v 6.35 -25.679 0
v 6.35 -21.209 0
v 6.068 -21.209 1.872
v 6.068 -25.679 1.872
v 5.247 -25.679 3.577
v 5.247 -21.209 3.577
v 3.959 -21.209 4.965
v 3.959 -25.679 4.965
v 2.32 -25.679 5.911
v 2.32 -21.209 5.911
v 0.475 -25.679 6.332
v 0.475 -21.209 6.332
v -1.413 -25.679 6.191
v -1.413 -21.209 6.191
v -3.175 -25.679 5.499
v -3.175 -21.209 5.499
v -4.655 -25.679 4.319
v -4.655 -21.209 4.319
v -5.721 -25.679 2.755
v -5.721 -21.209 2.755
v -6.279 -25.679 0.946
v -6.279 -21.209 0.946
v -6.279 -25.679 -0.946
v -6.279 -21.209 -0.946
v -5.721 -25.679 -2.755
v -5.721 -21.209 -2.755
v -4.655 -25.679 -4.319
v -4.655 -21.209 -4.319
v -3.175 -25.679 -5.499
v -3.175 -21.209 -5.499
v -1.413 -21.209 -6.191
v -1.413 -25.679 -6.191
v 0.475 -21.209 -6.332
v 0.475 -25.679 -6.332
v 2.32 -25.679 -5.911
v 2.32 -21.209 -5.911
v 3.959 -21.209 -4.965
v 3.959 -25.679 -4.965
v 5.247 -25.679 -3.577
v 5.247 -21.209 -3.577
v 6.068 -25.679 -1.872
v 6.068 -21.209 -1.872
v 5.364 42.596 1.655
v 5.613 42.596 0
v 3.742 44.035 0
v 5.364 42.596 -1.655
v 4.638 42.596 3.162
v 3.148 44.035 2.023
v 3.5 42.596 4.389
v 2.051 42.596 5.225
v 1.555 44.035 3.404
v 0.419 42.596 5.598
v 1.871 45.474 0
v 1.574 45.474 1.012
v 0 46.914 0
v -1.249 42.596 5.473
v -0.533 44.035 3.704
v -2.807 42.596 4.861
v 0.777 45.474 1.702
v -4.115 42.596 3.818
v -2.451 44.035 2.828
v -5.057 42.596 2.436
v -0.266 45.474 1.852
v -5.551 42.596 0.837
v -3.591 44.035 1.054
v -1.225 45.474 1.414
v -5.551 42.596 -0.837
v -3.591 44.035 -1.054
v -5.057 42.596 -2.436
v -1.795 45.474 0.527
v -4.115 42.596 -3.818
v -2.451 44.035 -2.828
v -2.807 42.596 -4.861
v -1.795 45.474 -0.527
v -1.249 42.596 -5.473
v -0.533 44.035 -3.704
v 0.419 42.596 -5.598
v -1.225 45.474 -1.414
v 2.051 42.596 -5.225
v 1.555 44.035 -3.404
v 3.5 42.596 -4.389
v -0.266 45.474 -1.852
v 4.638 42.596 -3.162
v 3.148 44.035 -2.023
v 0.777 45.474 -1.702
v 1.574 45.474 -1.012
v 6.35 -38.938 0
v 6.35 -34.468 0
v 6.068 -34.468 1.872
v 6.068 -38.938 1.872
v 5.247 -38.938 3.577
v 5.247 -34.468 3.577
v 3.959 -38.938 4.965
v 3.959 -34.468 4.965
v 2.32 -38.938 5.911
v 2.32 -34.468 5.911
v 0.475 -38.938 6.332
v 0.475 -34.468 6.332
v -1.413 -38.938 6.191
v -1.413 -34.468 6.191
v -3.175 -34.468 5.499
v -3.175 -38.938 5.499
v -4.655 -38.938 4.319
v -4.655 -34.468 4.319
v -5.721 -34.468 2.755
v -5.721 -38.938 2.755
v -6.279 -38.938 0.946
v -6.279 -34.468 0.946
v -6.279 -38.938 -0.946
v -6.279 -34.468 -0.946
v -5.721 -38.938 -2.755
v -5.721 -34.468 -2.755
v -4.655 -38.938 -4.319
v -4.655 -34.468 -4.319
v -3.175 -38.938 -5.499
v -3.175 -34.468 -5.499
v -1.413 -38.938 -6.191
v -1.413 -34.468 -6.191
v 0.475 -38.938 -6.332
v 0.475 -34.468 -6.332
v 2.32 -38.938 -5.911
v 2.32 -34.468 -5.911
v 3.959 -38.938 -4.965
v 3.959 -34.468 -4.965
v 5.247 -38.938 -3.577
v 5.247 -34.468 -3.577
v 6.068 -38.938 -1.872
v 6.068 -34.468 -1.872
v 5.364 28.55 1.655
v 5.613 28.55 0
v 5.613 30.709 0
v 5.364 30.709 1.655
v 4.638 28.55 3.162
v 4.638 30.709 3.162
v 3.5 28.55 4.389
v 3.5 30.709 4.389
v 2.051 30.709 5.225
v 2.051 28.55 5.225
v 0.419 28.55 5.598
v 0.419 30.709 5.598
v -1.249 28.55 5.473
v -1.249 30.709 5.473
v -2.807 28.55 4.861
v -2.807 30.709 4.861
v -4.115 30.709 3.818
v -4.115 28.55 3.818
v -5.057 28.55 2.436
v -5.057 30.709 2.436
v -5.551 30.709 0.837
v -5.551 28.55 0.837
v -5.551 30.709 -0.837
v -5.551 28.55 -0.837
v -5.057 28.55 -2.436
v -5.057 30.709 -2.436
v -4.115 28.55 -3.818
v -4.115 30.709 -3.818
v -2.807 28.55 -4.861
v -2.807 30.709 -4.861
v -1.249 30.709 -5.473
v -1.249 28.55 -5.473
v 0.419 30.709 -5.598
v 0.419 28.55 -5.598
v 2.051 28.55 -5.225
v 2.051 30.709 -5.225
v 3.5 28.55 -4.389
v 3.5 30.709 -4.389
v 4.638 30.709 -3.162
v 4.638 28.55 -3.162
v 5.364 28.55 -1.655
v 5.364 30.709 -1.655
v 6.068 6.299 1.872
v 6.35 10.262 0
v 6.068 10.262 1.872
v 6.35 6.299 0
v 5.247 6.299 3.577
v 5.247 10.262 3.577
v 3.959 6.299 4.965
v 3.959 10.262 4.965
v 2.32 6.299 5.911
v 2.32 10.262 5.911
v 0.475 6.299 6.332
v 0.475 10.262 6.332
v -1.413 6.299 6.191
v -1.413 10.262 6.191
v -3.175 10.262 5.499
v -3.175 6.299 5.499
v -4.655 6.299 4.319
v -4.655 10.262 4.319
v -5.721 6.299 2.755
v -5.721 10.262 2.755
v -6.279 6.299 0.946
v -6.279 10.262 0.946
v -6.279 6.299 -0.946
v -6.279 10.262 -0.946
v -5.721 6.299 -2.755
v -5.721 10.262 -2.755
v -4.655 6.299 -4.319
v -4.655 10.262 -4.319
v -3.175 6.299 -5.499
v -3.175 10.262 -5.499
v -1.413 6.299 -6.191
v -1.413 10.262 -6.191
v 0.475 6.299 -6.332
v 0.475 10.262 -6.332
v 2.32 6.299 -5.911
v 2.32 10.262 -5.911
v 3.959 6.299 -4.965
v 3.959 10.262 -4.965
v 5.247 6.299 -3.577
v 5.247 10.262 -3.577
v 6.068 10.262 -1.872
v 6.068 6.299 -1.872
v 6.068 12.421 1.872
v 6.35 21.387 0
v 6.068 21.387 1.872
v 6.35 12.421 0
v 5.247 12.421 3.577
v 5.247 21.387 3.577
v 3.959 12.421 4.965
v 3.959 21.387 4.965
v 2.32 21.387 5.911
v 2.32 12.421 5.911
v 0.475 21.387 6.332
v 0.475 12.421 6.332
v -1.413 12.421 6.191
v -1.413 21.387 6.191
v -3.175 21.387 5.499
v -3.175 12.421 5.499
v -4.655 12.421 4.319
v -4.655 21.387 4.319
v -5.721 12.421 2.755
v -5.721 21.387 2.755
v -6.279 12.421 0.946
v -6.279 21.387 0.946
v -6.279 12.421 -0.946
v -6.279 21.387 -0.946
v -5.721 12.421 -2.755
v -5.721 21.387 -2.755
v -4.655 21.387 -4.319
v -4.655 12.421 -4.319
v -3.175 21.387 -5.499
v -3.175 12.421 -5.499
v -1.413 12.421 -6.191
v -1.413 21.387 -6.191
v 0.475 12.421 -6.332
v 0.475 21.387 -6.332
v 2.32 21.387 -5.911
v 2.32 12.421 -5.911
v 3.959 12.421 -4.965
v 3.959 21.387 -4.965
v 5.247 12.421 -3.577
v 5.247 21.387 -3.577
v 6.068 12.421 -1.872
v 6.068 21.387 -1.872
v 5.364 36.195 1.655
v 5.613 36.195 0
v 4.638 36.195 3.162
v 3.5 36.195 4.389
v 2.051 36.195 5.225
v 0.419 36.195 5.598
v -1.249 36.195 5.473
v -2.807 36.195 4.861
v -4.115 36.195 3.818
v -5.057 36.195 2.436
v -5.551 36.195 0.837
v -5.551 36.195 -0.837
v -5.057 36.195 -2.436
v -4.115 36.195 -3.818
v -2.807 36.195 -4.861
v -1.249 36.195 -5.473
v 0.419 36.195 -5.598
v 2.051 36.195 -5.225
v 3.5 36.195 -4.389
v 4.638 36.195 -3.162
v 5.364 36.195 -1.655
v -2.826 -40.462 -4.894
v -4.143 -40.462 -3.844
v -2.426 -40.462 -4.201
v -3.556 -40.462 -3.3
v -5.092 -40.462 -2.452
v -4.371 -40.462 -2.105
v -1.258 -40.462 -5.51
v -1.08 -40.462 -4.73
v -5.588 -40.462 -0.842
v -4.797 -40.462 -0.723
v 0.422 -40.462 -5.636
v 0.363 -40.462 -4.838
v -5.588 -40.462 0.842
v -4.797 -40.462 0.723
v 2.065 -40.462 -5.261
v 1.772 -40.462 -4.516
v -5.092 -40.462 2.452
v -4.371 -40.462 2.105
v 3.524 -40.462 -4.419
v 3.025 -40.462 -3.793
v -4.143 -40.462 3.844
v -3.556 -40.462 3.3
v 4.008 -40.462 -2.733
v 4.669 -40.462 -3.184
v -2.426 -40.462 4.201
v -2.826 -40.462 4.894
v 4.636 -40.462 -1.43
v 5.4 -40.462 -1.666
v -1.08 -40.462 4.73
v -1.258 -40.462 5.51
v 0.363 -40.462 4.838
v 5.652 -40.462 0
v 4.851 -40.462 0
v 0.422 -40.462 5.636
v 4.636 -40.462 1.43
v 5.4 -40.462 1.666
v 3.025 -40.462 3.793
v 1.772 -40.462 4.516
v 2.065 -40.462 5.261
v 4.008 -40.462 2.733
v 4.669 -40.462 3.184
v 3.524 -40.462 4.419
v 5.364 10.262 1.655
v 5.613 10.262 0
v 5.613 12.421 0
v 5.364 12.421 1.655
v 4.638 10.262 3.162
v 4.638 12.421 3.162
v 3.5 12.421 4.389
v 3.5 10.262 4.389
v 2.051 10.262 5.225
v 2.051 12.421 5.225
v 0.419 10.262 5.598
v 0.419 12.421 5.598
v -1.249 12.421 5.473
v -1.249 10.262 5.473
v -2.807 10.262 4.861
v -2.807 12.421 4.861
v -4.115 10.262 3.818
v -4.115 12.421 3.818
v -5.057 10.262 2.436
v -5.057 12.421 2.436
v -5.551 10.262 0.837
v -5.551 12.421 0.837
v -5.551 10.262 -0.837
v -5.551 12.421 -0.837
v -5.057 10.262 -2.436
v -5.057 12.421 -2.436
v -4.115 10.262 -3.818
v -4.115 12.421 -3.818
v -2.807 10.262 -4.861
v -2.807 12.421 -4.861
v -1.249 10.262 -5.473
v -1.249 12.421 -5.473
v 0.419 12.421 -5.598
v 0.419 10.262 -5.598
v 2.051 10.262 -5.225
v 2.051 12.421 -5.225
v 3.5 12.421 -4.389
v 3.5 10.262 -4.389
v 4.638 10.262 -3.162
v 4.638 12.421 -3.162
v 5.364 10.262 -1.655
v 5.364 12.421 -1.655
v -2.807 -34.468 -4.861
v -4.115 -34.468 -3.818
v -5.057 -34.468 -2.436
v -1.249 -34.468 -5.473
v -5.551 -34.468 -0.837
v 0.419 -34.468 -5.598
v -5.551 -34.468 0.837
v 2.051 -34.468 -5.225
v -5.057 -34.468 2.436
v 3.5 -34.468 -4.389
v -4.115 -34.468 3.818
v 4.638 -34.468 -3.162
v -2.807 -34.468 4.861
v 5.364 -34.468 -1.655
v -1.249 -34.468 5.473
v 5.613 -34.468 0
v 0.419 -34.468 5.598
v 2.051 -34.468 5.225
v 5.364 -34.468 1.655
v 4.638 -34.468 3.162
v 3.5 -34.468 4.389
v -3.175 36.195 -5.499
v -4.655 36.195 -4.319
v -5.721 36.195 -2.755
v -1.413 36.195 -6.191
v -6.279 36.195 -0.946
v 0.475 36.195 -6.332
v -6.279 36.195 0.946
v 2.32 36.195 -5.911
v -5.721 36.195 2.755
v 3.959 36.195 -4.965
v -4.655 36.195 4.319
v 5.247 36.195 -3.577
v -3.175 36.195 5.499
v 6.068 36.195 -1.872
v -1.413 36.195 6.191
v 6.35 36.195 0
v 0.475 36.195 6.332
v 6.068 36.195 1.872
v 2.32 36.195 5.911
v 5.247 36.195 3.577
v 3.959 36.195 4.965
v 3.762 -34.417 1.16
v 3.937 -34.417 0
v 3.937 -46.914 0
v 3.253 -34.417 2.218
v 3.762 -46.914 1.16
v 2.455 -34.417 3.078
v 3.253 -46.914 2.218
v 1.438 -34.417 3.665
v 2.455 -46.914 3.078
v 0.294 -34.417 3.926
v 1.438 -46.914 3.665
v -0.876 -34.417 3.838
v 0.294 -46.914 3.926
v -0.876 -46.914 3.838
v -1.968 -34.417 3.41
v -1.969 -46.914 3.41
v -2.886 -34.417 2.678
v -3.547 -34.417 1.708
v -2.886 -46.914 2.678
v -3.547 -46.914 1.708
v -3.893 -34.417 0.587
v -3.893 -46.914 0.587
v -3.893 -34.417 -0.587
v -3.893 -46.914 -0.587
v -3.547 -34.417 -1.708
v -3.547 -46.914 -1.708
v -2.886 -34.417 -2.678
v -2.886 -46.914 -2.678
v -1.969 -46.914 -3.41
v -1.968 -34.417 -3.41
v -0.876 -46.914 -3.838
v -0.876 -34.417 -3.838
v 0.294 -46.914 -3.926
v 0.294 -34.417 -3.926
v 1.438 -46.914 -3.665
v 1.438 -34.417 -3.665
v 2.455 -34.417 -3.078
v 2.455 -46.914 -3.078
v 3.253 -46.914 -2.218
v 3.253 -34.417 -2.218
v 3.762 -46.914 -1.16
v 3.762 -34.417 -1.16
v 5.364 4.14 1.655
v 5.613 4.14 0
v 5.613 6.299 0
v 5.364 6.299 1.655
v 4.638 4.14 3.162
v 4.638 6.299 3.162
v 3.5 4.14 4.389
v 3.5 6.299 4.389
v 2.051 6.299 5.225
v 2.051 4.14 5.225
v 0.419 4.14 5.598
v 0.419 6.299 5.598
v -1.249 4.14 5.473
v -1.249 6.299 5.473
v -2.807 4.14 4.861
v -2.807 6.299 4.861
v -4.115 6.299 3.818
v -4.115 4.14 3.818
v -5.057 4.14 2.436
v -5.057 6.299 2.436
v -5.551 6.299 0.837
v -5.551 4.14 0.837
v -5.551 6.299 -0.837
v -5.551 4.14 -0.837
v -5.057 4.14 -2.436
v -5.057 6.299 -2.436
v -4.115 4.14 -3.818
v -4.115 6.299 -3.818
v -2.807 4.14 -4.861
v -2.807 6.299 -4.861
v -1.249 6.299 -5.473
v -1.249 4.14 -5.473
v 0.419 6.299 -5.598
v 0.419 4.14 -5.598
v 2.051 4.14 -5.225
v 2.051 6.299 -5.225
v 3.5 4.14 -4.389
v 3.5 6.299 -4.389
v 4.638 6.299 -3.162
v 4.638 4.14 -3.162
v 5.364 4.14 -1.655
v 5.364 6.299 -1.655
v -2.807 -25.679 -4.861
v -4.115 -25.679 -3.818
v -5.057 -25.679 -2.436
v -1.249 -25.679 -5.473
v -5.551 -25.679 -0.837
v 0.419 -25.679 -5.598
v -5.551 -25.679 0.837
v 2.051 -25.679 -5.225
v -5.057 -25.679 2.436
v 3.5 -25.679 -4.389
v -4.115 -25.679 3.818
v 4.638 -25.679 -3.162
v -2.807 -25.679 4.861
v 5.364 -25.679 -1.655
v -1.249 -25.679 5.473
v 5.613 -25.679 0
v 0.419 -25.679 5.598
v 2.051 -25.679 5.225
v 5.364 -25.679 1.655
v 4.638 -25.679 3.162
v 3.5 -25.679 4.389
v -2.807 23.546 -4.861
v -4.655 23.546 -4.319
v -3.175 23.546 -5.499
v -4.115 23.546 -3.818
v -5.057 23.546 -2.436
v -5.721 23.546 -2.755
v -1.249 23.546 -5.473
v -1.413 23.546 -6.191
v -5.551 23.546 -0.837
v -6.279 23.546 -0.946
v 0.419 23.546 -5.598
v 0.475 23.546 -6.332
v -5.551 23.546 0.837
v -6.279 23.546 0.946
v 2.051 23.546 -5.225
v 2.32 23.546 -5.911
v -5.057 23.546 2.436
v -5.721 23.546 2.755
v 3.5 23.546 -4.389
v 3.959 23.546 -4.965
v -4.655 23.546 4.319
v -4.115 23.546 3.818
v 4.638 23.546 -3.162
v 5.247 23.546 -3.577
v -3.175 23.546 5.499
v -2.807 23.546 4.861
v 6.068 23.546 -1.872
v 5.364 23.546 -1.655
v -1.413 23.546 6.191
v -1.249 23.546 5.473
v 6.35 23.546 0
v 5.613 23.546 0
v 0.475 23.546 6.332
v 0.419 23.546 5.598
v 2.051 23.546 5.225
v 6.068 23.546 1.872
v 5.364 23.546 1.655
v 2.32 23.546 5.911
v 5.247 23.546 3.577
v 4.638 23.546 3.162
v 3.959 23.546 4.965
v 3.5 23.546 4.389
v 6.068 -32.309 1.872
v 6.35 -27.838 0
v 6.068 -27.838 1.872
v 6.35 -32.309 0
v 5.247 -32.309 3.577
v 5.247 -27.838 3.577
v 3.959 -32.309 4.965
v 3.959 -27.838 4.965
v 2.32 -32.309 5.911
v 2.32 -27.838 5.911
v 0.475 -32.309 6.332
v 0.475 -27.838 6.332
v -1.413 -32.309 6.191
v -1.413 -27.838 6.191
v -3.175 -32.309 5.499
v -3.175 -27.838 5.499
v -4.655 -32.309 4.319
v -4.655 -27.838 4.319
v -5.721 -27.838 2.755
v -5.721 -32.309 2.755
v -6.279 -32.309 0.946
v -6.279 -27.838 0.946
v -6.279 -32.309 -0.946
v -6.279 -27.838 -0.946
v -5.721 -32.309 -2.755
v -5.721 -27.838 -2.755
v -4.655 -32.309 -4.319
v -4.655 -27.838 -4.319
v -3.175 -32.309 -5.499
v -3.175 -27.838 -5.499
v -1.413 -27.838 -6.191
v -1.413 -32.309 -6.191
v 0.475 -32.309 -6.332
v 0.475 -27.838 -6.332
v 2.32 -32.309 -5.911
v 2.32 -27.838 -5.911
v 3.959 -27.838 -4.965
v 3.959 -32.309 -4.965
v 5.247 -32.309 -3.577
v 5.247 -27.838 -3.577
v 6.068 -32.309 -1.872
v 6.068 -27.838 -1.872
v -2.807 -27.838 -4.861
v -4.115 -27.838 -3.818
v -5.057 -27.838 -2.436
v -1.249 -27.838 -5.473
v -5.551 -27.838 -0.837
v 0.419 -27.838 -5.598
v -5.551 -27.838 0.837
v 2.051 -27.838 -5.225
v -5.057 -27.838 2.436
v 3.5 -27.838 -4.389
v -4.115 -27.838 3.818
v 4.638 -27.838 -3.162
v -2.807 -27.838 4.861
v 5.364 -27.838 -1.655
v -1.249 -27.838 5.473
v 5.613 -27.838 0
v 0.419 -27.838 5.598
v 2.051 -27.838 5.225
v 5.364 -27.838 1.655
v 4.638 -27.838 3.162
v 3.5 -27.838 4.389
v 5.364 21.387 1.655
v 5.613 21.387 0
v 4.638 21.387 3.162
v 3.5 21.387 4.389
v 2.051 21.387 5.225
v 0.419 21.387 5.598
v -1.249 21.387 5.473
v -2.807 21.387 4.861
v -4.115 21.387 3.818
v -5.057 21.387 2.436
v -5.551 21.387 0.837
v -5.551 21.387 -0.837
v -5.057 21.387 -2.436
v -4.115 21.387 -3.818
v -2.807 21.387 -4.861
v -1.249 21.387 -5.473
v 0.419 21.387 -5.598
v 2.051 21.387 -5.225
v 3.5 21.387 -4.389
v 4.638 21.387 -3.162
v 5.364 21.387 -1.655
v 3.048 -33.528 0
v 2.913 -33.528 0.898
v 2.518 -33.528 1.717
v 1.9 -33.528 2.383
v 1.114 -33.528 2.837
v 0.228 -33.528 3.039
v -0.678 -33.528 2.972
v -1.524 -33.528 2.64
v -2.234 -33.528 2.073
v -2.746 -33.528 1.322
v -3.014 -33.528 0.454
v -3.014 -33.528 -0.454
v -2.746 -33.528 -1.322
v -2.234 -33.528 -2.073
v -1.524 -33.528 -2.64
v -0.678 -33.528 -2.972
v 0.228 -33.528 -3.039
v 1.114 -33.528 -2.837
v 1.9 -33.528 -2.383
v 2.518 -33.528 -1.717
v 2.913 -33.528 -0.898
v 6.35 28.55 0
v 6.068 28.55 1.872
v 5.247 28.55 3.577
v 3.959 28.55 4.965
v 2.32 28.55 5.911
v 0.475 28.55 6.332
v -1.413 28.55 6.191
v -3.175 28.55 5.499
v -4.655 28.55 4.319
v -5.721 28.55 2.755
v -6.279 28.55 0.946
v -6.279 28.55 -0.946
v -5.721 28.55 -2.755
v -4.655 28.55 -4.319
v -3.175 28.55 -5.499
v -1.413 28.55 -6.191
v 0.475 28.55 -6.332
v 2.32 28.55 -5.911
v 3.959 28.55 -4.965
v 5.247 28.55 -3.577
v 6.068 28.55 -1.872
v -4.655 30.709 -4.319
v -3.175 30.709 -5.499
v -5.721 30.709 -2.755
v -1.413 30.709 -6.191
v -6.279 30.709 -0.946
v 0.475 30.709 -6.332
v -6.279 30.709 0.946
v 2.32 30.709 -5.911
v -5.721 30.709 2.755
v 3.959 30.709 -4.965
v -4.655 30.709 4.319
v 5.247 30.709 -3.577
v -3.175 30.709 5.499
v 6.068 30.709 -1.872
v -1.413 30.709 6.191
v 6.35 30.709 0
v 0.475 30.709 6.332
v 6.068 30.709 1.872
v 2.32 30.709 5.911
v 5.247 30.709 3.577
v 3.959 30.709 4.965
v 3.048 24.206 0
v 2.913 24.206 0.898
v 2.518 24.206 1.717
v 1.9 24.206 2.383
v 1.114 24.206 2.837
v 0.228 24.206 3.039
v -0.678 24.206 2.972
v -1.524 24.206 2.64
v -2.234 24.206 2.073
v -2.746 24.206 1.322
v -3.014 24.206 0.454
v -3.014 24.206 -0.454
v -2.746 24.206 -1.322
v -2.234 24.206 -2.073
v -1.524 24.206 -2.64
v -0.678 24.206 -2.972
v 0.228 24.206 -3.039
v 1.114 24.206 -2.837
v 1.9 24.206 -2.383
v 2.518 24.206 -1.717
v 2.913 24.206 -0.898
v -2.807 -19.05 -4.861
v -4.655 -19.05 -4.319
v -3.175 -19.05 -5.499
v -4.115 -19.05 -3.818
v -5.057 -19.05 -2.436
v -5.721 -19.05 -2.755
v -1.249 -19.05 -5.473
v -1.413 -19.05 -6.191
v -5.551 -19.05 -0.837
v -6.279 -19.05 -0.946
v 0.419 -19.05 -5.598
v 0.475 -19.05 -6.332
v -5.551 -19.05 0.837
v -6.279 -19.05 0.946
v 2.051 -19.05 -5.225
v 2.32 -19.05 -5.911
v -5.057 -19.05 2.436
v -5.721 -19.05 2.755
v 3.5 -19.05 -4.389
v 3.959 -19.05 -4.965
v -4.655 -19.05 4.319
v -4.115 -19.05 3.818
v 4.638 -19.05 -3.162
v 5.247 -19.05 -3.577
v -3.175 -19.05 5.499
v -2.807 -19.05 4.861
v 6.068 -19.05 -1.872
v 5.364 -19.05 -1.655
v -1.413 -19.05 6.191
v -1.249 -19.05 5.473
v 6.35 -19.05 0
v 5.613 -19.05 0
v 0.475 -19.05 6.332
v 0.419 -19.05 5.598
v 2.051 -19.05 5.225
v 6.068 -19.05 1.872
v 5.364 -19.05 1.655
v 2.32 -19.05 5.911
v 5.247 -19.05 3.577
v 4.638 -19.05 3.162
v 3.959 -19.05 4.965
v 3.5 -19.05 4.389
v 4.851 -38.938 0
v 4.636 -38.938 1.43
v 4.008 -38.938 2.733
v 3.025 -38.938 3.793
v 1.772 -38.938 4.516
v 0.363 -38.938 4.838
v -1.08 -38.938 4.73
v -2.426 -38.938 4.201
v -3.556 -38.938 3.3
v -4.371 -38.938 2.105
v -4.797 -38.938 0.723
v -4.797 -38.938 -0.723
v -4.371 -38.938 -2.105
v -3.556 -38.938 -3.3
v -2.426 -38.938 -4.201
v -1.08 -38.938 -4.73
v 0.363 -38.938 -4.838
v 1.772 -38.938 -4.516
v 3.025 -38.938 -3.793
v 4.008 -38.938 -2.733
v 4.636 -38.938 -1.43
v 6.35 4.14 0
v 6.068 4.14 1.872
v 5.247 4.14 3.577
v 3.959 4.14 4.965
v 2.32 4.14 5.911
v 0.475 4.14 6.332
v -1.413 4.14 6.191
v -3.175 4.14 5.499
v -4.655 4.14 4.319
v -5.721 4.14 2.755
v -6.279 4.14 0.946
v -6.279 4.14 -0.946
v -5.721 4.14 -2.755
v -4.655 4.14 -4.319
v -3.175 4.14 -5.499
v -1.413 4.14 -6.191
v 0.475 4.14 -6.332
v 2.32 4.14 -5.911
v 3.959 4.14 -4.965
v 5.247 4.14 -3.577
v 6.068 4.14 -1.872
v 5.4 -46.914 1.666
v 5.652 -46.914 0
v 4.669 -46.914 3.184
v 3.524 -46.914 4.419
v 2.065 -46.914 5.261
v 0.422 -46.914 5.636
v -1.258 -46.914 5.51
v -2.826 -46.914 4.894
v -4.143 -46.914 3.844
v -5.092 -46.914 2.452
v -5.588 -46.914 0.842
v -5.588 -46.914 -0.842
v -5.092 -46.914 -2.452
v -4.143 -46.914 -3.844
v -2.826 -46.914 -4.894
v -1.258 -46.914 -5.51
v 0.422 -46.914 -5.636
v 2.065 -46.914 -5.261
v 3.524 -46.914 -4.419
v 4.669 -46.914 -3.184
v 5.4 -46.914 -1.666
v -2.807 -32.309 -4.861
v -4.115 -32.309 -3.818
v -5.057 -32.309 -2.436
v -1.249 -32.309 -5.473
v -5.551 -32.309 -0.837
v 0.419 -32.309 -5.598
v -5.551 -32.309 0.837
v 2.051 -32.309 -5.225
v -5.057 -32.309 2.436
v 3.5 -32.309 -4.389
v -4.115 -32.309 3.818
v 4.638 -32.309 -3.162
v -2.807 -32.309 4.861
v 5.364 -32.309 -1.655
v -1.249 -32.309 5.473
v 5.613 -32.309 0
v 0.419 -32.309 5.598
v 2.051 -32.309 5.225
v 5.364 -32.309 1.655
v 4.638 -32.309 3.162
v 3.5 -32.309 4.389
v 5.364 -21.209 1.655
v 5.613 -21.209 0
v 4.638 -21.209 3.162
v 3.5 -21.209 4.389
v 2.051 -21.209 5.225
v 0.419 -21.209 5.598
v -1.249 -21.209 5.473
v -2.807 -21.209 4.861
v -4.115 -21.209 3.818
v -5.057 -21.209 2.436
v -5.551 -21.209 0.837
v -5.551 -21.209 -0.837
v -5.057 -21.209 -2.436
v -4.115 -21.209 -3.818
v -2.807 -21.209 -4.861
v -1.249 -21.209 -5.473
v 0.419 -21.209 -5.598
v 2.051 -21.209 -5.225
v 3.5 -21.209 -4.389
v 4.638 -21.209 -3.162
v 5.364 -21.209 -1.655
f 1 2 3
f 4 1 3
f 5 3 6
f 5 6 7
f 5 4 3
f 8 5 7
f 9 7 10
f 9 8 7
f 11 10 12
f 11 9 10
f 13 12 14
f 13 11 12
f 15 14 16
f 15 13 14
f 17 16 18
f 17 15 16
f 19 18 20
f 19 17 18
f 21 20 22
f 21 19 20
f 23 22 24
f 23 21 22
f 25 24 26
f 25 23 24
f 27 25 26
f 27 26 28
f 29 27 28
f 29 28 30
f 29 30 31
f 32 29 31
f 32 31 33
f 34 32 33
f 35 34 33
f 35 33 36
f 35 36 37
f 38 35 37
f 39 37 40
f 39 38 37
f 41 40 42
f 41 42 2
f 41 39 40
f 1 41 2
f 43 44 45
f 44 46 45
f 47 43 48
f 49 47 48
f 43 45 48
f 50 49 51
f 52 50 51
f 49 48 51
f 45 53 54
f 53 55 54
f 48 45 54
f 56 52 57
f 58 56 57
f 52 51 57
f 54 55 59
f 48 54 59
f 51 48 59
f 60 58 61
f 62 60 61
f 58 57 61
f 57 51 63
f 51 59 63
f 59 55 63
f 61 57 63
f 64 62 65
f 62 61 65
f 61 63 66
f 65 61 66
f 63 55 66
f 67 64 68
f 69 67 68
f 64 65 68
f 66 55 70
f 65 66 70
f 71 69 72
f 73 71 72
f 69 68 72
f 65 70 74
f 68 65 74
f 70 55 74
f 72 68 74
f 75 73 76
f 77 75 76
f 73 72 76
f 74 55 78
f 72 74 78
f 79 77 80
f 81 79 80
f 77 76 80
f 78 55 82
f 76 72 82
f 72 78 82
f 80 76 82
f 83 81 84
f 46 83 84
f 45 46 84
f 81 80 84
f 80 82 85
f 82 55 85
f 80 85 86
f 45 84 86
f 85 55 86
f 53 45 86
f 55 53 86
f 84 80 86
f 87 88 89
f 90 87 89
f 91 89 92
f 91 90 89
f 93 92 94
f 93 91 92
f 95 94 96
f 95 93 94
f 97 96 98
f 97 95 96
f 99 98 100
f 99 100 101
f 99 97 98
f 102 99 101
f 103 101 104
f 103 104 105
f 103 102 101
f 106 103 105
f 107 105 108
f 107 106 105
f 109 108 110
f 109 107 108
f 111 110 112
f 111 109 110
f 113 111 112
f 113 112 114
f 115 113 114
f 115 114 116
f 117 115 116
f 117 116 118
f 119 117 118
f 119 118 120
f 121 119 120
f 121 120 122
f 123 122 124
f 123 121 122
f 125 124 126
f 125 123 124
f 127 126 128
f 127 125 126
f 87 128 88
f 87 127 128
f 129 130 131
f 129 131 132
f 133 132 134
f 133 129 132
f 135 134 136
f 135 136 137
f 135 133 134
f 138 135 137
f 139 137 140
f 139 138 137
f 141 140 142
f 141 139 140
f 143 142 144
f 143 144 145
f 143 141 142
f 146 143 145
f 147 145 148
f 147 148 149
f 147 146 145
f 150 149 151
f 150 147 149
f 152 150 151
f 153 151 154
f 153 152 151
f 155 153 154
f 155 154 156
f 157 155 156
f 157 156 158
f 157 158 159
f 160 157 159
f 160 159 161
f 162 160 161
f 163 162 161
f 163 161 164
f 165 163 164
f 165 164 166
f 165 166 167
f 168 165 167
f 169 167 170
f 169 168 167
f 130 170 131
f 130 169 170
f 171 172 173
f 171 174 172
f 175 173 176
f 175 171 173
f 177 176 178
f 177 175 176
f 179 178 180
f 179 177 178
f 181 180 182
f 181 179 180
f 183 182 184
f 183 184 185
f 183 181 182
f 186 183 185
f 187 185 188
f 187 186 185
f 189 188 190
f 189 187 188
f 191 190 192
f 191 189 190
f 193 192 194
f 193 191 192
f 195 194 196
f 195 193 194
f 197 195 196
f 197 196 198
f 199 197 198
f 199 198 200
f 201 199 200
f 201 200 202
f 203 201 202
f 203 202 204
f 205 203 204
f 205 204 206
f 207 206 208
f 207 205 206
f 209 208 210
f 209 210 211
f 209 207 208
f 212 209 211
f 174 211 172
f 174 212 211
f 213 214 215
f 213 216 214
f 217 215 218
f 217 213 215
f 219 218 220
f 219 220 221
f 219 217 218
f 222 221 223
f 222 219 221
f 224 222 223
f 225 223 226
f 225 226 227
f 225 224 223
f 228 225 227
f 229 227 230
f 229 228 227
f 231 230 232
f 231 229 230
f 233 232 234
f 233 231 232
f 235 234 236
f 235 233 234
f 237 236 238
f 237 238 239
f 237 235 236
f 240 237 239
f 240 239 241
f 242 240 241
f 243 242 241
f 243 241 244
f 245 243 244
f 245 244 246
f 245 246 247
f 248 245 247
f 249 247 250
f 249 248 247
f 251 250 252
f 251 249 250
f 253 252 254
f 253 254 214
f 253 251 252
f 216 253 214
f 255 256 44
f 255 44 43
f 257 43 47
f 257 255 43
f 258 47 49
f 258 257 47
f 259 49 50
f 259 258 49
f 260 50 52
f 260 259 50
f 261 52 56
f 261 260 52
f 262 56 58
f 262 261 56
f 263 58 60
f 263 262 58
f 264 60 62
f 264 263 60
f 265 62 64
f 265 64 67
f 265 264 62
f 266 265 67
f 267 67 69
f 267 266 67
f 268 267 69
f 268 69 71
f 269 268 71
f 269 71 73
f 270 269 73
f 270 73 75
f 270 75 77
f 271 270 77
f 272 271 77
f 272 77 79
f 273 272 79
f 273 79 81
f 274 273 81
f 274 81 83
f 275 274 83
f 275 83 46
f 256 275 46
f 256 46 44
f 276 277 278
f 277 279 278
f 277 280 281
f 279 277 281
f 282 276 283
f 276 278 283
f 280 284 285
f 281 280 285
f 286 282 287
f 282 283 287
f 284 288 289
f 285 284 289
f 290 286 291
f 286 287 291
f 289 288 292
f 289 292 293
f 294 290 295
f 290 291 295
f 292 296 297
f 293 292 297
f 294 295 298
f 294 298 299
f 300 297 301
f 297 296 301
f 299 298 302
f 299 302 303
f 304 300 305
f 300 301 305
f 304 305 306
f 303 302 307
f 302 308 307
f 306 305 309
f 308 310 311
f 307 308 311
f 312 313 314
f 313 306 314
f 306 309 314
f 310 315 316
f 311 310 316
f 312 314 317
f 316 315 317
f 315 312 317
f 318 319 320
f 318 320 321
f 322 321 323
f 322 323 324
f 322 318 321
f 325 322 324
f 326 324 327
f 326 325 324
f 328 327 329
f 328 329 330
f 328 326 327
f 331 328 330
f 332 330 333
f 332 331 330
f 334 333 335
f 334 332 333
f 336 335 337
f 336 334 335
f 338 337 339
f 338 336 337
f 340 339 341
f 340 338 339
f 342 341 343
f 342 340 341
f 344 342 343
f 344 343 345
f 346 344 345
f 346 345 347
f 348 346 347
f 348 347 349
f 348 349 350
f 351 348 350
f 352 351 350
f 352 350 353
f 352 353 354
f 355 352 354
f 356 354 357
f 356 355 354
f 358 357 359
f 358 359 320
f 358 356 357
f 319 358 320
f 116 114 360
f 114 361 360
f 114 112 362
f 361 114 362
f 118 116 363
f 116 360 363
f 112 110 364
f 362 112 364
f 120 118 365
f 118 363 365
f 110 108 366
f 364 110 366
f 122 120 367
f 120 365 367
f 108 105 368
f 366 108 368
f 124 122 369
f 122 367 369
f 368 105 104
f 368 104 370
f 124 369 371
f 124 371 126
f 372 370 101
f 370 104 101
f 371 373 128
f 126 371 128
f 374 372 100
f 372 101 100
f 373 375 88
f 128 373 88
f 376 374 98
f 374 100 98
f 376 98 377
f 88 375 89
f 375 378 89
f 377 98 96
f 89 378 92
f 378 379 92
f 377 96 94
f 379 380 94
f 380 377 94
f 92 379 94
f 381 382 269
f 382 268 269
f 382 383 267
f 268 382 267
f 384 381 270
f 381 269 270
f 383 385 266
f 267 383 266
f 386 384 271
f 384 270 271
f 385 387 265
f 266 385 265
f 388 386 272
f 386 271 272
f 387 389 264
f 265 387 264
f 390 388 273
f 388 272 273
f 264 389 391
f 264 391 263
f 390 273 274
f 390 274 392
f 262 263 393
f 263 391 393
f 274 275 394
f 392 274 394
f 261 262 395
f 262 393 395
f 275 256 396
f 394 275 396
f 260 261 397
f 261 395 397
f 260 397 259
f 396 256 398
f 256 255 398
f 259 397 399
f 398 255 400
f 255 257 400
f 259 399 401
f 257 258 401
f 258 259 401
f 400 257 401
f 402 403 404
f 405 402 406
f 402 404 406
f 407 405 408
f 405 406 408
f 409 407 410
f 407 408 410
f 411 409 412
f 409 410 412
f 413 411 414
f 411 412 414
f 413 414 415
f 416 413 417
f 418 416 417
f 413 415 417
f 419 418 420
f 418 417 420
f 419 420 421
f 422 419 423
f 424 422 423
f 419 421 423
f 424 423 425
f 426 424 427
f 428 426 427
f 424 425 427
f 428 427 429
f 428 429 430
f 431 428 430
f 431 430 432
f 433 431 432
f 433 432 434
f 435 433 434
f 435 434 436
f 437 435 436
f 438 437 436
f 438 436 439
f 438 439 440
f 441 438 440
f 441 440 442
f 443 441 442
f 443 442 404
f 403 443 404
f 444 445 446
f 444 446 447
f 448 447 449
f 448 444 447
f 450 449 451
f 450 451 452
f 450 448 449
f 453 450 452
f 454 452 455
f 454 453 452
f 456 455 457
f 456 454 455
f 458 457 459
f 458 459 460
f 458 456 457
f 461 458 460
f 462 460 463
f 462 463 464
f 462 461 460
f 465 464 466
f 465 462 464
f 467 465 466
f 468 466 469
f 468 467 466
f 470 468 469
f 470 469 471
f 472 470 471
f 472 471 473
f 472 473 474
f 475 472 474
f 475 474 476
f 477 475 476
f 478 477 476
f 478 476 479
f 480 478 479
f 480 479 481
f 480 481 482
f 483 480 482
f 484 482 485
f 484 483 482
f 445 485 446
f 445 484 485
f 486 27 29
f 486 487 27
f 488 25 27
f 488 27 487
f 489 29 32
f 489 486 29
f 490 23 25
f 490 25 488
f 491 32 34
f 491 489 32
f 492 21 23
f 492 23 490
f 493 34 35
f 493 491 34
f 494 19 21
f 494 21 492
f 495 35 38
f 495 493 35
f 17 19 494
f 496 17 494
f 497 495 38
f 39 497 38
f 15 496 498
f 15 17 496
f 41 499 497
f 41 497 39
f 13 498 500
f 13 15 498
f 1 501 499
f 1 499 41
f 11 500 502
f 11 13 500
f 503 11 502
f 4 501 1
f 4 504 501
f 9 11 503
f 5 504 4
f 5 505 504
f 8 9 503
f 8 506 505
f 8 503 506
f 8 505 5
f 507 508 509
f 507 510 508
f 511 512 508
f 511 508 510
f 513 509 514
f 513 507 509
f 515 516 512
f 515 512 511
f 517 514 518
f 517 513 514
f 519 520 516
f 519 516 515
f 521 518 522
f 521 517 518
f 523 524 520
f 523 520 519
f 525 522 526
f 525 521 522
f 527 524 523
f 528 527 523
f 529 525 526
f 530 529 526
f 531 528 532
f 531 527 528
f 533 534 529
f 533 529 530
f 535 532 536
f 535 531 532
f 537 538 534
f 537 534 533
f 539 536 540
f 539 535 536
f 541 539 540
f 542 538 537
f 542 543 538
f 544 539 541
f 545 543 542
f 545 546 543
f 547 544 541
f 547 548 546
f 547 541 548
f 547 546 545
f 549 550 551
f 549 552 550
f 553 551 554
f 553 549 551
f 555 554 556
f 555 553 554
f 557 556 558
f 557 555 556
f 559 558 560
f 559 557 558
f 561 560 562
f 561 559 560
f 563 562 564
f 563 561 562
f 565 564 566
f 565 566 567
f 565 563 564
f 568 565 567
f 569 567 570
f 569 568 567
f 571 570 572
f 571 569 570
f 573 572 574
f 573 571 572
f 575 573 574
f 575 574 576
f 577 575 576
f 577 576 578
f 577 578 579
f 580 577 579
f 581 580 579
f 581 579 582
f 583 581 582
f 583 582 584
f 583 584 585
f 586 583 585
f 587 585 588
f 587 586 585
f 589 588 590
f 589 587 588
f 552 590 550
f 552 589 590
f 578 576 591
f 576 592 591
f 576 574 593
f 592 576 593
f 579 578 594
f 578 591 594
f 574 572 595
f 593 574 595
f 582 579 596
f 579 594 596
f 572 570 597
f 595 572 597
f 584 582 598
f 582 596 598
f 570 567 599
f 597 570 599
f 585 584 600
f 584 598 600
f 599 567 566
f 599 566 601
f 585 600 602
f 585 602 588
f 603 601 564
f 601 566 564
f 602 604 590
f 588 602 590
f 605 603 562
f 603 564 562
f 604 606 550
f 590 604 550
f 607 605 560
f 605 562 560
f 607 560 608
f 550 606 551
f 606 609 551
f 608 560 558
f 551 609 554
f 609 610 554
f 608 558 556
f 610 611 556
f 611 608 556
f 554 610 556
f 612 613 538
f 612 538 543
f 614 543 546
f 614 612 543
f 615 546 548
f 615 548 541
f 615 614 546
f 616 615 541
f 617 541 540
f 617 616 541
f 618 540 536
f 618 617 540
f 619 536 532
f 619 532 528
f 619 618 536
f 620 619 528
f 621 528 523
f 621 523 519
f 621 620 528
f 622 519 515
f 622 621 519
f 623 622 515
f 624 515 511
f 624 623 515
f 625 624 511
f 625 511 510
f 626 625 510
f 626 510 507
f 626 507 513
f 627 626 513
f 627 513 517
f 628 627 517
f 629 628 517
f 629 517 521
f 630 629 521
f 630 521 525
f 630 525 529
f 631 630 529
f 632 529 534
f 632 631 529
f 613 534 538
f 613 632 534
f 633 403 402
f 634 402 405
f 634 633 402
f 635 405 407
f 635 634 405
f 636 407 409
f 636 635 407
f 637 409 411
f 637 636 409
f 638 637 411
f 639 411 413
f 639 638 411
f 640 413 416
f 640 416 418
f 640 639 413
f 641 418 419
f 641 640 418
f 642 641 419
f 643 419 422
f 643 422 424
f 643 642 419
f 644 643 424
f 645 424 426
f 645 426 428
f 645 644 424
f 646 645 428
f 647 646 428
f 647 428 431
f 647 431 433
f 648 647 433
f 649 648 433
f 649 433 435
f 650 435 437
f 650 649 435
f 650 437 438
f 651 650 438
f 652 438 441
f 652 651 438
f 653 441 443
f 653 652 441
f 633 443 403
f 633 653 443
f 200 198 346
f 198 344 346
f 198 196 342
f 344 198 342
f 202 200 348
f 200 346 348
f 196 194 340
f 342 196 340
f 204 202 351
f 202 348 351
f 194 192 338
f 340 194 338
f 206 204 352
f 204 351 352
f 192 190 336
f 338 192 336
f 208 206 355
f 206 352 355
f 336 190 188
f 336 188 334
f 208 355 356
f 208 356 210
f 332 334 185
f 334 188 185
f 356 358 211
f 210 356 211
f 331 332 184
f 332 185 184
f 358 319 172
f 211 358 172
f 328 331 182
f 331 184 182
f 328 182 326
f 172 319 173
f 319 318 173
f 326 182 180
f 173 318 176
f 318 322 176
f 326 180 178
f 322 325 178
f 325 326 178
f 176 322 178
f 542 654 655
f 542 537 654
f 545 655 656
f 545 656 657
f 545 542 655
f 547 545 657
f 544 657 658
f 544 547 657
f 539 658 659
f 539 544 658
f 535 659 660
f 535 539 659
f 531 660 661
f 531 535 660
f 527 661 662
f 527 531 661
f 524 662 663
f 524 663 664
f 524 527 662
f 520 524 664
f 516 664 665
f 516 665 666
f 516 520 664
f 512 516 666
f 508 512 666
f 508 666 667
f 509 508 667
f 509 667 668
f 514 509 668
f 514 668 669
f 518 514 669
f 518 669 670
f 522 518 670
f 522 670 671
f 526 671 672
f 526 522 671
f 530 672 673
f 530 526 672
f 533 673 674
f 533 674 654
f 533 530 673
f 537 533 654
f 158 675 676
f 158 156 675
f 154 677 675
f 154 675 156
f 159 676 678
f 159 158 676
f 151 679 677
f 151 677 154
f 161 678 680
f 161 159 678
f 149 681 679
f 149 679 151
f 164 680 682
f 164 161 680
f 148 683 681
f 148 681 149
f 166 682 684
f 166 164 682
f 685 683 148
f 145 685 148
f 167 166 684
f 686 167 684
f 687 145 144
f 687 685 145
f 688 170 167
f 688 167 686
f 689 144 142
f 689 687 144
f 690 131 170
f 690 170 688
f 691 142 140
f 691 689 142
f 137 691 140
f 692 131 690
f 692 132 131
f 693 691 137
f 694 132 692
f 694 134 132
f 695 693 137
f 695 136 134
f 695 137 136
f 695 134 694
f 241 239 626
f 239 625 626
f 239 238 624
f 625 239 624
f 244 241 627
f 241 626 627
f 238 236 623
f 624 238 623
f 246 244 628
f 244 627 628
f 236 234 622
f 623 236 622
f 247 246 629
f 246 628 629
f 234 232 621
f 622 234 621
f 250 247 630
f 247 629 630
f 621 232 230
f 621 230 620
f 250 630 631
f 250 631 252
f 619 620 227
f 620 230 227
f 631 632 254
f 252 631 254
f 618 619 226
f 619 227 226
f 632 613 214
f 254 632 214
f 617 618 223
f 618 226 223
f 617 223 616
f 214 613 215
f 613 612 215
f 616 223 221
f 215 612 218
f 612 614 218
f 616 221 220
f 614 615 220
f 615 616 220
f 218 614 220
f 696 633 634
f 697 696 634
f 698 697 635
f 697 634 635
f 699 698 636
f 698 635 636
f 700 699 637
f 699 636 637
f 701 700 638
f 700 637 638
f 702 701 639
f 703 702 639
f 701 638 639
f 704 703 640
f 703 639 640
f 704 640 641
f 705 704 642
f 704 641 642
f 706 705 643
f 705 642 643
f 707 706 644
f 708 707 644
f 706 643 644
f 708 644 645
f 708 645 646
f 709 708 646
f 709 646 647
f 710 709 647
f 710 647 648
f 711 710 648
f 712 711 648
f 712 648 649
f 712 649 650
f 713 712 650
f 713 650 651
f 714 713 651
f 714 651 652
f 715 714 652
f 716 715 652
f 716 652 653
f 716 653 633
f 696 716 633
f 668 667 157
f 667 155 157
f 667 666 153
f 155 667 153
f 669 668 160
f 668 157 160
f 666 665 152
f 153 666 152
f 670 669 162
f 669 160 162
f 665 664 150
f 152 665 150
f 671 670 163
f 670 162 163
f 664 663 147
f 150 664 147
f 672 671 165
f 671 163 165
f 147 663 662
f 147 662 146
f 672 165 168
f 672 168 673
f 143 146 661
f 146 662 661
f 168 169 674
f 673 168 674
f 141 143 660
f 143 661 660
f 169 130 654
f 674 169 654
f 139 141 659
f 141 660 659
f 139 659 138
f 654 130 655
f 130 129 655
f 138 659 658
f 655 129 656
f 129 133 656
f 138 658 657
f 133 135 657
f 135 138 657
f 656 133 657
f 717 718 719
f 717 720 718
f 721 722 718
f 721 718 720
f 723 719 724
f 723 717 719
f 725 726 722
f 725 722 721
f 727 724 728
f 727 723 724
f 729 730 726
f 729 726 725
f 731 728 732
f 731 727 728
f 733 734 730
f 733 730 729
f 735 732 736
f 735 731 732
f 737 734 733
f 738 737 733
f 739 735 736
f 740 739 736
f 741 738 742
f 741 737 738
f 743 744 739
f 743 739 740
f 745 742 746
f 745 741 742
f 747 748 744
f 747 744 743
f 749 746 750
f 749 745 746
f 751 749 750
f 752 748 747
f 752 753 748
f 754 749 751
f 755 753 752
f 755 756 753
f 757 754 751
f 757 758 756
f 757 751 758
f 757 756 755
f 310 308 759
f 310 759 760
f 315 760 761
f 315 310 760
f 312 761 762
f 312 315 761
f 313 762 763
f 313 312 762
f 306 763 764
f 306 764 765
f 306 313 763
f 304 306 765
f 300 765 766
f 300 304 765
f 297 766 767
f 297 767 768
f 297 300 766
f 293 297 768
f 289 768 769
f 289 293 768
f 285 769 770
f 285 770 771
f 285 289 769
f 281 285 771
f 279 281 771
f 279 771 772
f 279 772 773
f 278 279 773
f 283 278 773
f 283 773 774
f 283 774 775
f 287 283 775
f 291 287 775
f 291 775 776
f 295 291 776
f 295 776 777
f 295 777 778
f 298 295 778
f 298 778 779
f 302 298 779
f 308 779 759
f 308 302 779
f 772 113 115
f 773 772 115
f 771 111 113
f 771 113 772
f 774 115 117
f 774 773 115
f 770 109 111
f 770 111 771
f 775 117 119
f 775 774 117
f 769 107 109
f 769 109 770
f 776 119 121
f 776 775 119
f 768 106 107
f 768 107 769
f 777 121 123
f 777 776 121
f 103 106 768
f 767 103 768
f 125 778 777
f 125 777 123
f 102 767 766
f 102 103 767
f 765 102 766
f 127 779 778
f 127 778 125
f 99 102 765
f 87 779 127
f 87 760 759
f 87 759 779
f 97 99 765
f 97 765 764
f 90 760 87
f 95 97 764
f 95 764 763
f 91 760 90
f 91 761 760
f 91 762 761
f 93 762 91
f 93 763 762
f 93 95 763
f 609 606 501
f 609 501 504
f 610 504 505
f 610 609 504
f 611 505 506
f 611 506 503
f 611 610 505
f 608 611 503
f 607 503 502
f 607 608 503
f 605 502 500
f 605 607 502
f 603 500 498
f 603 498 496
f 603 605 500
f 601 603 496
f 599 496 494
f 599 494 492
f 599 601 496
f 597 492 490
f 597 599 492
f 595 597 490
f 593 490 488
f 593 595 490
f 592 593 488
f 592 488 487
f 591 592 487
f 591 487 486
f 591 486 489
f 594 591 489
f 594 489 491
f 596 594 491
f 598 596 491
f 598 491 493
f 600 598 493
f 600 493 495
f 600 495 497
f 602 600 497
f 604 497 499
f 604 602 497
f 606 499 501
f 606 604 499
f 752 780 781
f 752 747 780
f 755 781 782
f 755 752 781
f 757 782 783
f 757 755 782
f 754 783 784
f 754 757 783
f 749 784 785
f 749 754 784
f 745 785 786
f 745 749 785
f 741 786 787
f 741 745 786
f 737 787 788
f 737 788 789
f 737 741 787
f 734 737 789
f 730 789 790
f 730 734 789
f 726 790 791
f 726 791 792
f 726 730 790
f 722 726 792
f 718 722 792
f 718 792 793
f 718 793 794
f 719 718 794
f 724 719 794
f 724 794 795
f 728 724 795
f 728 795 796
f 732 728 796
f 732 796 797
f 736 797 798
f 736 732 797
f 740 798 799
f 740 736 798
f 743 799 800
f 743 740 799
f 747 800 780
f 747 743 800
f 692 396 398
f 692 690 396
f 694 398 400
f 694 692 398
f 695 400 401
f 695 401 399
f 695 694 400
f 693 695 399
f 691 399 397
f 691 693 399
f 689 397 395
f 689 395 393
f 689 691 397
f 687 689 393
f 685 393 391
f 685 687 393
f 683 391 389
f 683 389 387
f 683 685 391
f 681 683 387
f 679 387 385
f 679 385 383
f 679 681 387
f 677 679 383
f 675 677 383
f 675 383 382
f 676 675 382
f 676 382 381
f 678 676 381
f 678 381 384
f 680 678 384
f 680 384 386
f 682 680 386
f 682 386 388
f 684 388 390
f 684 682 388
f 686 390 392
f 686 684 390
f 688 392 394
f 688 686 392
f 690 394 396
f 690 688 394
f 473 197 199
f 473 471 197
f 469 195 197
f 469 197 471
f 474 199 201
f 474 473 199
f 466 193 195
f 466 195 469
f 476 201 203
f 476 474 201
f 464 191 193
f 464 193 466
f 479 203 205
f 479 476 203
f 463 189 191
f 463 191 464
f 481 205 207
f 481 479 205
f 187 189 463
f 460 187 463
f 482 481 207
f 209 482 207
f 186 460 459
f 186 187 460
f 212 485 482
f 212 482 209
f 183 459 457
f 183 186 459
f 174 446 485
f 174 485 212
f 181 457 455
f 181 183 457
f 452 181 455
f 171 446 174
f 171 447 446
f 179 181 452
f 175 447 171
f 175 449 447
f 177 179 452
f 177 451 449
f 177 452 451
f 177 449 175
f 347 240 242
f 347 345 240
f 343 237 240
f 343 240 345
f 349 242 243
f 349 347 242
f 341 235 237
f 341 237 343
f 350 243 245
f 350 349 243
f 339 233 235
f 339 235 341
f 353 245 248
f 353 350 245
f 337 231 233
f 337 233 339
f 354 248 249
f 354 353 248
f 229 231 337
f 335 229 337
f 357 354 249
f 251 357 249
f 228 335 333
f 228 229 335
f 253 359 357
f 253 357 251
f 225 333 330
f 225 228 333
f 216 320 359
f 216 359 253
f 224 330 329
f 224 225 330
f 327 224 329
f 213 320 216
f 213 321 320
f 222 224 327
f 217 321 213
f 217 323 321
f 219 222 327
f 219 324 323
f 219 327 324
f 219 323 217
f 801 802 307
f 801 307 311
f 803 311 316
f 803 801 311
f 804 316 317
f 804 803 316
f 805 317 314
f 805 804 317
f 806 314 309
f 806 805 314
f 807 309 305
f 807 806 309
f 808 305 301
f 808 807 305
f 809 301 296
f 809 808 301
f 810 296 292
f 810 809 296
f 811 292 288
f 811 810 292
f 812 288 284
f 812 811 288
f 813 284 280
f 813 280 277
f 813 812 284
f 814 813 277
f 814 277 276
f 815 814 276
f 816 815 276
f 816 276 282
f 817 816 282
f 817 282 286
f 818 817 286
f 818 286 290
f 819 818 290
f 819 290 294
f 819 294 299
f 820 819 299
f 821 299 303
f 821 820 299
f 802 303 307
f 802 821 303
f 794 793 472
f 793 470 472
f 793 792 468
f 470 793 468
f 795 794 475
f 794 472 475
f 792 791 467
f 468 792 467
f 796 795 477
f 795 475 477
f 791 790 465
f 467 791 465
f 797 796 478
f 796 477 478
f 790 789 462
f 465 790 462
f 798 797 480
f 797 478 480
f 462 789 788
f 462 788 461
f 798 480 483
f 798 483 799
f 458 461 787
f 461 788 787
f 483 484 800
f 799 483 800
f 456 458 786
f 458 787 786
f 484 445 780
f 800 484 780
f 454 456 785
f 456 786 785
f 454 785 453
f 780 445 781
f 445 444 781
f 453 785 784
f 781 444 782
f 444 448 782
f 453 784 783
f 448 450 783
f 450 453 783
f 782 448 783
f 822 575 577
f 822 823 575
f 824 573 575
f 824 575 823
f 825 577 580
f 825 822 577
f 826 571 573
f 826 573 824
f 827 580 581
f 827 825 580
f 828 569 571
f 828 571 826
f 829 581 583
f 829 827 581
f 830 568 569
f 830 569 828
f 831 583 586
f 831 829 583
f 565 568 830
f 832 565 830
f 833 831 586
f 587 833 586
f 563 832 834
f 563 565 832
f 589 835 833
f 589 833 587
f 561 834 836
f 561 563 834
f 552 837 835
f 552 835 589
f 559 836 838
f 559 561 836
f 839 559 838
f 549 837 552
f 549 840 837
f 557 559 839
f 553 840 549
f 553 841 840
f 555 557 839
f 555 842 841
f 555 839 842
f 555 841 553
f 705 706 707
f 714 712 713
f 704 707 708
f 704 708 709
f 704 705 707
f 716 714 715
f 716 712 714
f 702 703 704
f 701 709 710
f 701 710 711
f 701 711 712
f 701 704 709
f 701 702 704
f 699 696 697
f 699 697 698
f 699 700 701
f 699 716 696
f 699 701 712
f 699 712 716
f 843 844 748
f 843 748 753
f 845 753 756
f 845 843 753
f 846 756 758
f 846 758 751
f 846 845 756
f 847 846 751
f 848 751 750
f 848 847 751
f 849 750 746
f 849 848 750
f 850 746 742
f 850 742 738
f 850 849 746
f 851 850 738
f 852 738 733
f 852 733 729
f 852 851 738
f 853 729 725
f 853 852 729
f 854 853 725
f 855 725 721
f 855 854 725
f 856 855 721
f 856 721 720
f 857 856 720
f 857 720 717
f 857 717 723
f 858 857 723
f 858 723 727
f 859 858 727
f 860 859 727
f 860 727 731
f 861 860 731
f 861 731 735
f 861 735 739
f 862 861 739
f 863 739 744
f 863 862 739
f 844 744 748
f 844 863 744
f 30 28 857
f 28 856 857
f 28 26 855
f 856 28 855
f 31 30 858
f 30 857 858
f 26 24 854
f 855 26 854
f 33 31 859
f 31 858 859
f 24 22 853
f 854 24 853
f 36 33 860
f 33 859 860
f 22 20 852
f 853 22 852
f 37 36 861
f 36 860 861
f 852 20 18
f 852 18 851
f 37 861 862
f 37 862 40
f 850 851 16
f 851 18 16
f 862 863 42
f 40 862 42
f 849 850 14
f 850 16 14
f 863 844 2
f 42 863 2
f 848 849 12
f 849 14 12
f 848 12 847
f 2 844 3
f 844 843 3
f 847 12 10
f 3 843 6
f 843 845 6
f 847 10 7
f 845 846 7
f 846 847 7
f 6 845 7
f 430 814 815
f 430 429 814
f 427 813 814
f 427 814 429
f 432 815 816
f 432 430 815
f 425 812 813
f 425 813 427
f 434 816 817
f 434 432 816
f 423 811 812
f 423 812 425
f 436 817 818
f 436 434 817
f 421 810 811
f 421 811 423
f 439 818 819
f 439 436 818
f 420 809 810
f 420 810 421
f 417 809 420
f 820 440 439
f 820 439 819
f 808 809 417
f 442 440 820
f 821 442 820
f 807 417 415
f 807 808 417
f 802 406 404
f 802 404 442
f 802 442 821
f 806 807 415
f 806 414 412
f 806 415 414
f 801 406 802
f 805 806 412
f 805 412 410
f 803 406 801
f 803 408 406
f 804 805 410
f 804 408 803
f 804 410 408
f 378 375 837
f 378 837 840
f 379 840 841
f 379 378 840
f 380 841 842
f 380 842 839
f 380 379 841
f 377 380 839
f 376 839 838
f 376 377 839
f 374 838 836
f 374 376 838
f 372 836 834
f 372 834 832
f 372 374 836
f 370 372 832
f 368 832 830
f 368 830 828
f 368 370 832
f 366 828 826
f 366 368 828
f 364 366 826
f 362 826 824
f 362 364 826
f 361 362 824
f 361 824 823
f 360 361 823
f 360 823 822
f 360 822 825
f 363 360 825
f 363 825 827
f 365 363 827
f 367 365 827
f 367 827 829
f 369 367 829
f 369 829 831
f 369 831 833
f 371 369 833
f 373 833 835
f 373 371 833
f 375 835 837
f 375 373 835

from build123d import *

# Parameters (mm, degrees)
F0_R         = 6.35
F1_DEPTH     = 46.9138
F2_R         = 3.048
F3_DEPTH     = 71.12
F4_R         = 3.937
F5_DEPTH     = 12.3698
F6_R         = 6.35
F6_R_2       = 5.6515
F7_DEPTH     = 6.4516
F8_R         = 6.35
F8_R_2       = 4.8514
F9_DEPTH     = 1.524
F10_S5_R     = 3.937
F10_T6_DEPTH = 7
F12_R        = 6.35
F12_R_2      = 5.6134
F13_DEPTH    = 2.159
F15_R        = 6.35
F15_R_2      = 5.6134
F16_DEPTH    = 2.159
F18_R        = 6.35
F18_R_2      = 5.6134
F19_DEPTH    = 2.159
F21_R        = 6.35
F21_R_2      = 5.6134
F22_DEPTH    = 2.159
F24_R        = 6.35
F24_R_2      = 5.6134
F25_DEPTH    = 2.159
F27_R        = 6.35
F27_R_2      = 5.6134
F28_DEPTH    = 2.159
F30_R        = 6.35
F30_R_2      = 5.6134
F31_DEPTH    = 2.159
F33_R        = 6.35
F33_R_2      = 5.6134
F34_DEPTH    = 10.7198
F35_SIZE2    = 5.6134
F35_SIZE     = 4.318


# Not quite as in the source:
# - a fillet or chamfer that OpenCascade refuses, or shapes differently, is made with other operations: its cross-section is extruded or revolved along the edge and cut away or added


with BuildPart() as f1:
    # F0 (on Front) → F1 (new body, symmetric)
    with BuildSketch(Plane.XZ):
        Circle(F0_R)
    extrude(amount=F1_DEPTH, both=True)

    # F2 (on face) → F3 (cut)
    with BuildSketch(Plane.XZ.offset(46.9138)):
        Circle(F2_R)
    extrude(amount=-F3_DEPTH, mode=Mode.SUBTRACT)

    # F4 (on face) → F5 (cut)
    with BuildSketch(Plane.XZ.offset(46.9138)):
        Circle(F4_R)
    extrude(amount=-F5_DEPTH, mode=Mode.SUBTRACT)

    # F6 (on face) → F7 (cut)
    with BuildSketch(Plane.XZ.offset(46.9138)):
        Circle(F6_R)
        Circle(F6_R_2, mode=Mode.SUBTRACT)
    extrude(amount=-F7_DEPTH, mode=Mode.SUBTRACT)

    # F8 (on face) → F9 (cut)
    with BuildSketch(Plane.XZ.offset(40.4622)):
        Circle(F8_R)
        Circle(F8_R_2, mode=Mode.SUBTRACT)
    extrude(amount=-F9_DEPTH, mode=Mode.SUBTRACT)

    # F10: chamfer of 1.016 on 1 edges, made by hand


with BuildPart() as f10_tool2:
    # F10_s3 → F10_t4 (revolve)
    with BuildSketch(Plane.XY):
        Polygon((4.064, -34.544), (3.048, -33.528), (3.048, -34.544), align=None)
    revolve(axis=Axis((0, -34.544, 0), (0, -1, 0)))

    # F10_s5 → F10_t6 (intersect, symmetric)
    with BuildSketch(Plane.XZ.offset(34)):
        Circle(F10_S5_R)
    extrude(amount=F10_T6_DEPTH, both=True, mode=Mode.INTERSECT)


with BuildPart() as f1_1:
    add(f1.part)

    # F10_t1: cut F10_tool2
    add(f10_tool2.part, mode=Mode.SUBTRACT)

    # F12 (on offset) → F13 (cut)
    with BuildSketch(Plane.XZ.offset(34.4678)):
        Circle(F12_R)
        Circle(F12_R_2, mode=Mode.SUBTRACT)
    extrude(amount=-F13_DEPTH, mode=Mode.SUBTRACT)

    # F15 (on offset) → F16 (cut)
    with BuildSketch(Plane.XZ.offset(27.8384)):
        Circle(F15_R)
        Circle(F15_R_2, mode=Mode.SUBTRACT)
    extrude(amount=-F16_DEPTH, mode=Mode.SUBTRACT)

    # F18 (on offset) → F19 (cut)
    with BuildSketch(Plane.XZ.offset(21.209)):
        Circle(F18_R)
        Circle(F18_R_2, mode=Mode.SUBTRACT)
    extrude(amount=-F19_DEPTH, mode=Mode.SUBTRACT)

    # F21 (on offset) → F22 (cut)
    with BuildSketch(Plane.XZ.offset(-4.1402)):
        Circle(F21_R)
        Circle(F21_R_2, mode=Mode.SUBTRACT)
    extrude(amount=-F22_DEPTH, mode=Mode.SUBTRACT)

    # F24 (on offset) → F25 (cut)
    with BuildSketch(Plane.XZ.offset(-10.2616)):
        Circle(F24_R)
        Circle(F24_R_2, mode=Mode.SUBTRACT)
    extrude(amount=-F25_DEPTH, mode=Mode.SUBTRACT)

    # F27 (on offset) → F28 (cut)
    with BuildSketch(Plane.XZ.offset(-21.3868)):
        Circle(F27_R)
        Circle(F27_R_2, mode=Mode.SUBTRACT)
    extrude(amount=-F28_DEPTH, mode=Mode.SUBTRACT)

    # F30 (on offset) → F31 (cut)
    with BuildSketch(Plane.XZ.offset(-28.5496)):
        Circle(F30_R)
        Circle(F30_R_2, mode=Mode.SUBTRACT)
    extrude(amount=-F31_DEPTH, mode=Mode.SUBTRACT)

    # F33 (on offset) → F34 (cut, through all)
    with BuildSketch(Plane.XZ.offset(-36.195)):
        Circle(F33_R)
        Circle(F33_R_2, mode=Mode.SUBTRACT)
    extrude(amount=-F34_DEPTH, mode=Mode.SUBTRACT)

    # F35
    f35_edges = [f1_1.edges().sort_by_distance(p)[0] for p in [
        (-5.6134, 46.9138, 0),
    ]]
    chamfer(f35_edges, length=F35_SIZE, length2=F35_SIZE2)


solid = f1_1.part
